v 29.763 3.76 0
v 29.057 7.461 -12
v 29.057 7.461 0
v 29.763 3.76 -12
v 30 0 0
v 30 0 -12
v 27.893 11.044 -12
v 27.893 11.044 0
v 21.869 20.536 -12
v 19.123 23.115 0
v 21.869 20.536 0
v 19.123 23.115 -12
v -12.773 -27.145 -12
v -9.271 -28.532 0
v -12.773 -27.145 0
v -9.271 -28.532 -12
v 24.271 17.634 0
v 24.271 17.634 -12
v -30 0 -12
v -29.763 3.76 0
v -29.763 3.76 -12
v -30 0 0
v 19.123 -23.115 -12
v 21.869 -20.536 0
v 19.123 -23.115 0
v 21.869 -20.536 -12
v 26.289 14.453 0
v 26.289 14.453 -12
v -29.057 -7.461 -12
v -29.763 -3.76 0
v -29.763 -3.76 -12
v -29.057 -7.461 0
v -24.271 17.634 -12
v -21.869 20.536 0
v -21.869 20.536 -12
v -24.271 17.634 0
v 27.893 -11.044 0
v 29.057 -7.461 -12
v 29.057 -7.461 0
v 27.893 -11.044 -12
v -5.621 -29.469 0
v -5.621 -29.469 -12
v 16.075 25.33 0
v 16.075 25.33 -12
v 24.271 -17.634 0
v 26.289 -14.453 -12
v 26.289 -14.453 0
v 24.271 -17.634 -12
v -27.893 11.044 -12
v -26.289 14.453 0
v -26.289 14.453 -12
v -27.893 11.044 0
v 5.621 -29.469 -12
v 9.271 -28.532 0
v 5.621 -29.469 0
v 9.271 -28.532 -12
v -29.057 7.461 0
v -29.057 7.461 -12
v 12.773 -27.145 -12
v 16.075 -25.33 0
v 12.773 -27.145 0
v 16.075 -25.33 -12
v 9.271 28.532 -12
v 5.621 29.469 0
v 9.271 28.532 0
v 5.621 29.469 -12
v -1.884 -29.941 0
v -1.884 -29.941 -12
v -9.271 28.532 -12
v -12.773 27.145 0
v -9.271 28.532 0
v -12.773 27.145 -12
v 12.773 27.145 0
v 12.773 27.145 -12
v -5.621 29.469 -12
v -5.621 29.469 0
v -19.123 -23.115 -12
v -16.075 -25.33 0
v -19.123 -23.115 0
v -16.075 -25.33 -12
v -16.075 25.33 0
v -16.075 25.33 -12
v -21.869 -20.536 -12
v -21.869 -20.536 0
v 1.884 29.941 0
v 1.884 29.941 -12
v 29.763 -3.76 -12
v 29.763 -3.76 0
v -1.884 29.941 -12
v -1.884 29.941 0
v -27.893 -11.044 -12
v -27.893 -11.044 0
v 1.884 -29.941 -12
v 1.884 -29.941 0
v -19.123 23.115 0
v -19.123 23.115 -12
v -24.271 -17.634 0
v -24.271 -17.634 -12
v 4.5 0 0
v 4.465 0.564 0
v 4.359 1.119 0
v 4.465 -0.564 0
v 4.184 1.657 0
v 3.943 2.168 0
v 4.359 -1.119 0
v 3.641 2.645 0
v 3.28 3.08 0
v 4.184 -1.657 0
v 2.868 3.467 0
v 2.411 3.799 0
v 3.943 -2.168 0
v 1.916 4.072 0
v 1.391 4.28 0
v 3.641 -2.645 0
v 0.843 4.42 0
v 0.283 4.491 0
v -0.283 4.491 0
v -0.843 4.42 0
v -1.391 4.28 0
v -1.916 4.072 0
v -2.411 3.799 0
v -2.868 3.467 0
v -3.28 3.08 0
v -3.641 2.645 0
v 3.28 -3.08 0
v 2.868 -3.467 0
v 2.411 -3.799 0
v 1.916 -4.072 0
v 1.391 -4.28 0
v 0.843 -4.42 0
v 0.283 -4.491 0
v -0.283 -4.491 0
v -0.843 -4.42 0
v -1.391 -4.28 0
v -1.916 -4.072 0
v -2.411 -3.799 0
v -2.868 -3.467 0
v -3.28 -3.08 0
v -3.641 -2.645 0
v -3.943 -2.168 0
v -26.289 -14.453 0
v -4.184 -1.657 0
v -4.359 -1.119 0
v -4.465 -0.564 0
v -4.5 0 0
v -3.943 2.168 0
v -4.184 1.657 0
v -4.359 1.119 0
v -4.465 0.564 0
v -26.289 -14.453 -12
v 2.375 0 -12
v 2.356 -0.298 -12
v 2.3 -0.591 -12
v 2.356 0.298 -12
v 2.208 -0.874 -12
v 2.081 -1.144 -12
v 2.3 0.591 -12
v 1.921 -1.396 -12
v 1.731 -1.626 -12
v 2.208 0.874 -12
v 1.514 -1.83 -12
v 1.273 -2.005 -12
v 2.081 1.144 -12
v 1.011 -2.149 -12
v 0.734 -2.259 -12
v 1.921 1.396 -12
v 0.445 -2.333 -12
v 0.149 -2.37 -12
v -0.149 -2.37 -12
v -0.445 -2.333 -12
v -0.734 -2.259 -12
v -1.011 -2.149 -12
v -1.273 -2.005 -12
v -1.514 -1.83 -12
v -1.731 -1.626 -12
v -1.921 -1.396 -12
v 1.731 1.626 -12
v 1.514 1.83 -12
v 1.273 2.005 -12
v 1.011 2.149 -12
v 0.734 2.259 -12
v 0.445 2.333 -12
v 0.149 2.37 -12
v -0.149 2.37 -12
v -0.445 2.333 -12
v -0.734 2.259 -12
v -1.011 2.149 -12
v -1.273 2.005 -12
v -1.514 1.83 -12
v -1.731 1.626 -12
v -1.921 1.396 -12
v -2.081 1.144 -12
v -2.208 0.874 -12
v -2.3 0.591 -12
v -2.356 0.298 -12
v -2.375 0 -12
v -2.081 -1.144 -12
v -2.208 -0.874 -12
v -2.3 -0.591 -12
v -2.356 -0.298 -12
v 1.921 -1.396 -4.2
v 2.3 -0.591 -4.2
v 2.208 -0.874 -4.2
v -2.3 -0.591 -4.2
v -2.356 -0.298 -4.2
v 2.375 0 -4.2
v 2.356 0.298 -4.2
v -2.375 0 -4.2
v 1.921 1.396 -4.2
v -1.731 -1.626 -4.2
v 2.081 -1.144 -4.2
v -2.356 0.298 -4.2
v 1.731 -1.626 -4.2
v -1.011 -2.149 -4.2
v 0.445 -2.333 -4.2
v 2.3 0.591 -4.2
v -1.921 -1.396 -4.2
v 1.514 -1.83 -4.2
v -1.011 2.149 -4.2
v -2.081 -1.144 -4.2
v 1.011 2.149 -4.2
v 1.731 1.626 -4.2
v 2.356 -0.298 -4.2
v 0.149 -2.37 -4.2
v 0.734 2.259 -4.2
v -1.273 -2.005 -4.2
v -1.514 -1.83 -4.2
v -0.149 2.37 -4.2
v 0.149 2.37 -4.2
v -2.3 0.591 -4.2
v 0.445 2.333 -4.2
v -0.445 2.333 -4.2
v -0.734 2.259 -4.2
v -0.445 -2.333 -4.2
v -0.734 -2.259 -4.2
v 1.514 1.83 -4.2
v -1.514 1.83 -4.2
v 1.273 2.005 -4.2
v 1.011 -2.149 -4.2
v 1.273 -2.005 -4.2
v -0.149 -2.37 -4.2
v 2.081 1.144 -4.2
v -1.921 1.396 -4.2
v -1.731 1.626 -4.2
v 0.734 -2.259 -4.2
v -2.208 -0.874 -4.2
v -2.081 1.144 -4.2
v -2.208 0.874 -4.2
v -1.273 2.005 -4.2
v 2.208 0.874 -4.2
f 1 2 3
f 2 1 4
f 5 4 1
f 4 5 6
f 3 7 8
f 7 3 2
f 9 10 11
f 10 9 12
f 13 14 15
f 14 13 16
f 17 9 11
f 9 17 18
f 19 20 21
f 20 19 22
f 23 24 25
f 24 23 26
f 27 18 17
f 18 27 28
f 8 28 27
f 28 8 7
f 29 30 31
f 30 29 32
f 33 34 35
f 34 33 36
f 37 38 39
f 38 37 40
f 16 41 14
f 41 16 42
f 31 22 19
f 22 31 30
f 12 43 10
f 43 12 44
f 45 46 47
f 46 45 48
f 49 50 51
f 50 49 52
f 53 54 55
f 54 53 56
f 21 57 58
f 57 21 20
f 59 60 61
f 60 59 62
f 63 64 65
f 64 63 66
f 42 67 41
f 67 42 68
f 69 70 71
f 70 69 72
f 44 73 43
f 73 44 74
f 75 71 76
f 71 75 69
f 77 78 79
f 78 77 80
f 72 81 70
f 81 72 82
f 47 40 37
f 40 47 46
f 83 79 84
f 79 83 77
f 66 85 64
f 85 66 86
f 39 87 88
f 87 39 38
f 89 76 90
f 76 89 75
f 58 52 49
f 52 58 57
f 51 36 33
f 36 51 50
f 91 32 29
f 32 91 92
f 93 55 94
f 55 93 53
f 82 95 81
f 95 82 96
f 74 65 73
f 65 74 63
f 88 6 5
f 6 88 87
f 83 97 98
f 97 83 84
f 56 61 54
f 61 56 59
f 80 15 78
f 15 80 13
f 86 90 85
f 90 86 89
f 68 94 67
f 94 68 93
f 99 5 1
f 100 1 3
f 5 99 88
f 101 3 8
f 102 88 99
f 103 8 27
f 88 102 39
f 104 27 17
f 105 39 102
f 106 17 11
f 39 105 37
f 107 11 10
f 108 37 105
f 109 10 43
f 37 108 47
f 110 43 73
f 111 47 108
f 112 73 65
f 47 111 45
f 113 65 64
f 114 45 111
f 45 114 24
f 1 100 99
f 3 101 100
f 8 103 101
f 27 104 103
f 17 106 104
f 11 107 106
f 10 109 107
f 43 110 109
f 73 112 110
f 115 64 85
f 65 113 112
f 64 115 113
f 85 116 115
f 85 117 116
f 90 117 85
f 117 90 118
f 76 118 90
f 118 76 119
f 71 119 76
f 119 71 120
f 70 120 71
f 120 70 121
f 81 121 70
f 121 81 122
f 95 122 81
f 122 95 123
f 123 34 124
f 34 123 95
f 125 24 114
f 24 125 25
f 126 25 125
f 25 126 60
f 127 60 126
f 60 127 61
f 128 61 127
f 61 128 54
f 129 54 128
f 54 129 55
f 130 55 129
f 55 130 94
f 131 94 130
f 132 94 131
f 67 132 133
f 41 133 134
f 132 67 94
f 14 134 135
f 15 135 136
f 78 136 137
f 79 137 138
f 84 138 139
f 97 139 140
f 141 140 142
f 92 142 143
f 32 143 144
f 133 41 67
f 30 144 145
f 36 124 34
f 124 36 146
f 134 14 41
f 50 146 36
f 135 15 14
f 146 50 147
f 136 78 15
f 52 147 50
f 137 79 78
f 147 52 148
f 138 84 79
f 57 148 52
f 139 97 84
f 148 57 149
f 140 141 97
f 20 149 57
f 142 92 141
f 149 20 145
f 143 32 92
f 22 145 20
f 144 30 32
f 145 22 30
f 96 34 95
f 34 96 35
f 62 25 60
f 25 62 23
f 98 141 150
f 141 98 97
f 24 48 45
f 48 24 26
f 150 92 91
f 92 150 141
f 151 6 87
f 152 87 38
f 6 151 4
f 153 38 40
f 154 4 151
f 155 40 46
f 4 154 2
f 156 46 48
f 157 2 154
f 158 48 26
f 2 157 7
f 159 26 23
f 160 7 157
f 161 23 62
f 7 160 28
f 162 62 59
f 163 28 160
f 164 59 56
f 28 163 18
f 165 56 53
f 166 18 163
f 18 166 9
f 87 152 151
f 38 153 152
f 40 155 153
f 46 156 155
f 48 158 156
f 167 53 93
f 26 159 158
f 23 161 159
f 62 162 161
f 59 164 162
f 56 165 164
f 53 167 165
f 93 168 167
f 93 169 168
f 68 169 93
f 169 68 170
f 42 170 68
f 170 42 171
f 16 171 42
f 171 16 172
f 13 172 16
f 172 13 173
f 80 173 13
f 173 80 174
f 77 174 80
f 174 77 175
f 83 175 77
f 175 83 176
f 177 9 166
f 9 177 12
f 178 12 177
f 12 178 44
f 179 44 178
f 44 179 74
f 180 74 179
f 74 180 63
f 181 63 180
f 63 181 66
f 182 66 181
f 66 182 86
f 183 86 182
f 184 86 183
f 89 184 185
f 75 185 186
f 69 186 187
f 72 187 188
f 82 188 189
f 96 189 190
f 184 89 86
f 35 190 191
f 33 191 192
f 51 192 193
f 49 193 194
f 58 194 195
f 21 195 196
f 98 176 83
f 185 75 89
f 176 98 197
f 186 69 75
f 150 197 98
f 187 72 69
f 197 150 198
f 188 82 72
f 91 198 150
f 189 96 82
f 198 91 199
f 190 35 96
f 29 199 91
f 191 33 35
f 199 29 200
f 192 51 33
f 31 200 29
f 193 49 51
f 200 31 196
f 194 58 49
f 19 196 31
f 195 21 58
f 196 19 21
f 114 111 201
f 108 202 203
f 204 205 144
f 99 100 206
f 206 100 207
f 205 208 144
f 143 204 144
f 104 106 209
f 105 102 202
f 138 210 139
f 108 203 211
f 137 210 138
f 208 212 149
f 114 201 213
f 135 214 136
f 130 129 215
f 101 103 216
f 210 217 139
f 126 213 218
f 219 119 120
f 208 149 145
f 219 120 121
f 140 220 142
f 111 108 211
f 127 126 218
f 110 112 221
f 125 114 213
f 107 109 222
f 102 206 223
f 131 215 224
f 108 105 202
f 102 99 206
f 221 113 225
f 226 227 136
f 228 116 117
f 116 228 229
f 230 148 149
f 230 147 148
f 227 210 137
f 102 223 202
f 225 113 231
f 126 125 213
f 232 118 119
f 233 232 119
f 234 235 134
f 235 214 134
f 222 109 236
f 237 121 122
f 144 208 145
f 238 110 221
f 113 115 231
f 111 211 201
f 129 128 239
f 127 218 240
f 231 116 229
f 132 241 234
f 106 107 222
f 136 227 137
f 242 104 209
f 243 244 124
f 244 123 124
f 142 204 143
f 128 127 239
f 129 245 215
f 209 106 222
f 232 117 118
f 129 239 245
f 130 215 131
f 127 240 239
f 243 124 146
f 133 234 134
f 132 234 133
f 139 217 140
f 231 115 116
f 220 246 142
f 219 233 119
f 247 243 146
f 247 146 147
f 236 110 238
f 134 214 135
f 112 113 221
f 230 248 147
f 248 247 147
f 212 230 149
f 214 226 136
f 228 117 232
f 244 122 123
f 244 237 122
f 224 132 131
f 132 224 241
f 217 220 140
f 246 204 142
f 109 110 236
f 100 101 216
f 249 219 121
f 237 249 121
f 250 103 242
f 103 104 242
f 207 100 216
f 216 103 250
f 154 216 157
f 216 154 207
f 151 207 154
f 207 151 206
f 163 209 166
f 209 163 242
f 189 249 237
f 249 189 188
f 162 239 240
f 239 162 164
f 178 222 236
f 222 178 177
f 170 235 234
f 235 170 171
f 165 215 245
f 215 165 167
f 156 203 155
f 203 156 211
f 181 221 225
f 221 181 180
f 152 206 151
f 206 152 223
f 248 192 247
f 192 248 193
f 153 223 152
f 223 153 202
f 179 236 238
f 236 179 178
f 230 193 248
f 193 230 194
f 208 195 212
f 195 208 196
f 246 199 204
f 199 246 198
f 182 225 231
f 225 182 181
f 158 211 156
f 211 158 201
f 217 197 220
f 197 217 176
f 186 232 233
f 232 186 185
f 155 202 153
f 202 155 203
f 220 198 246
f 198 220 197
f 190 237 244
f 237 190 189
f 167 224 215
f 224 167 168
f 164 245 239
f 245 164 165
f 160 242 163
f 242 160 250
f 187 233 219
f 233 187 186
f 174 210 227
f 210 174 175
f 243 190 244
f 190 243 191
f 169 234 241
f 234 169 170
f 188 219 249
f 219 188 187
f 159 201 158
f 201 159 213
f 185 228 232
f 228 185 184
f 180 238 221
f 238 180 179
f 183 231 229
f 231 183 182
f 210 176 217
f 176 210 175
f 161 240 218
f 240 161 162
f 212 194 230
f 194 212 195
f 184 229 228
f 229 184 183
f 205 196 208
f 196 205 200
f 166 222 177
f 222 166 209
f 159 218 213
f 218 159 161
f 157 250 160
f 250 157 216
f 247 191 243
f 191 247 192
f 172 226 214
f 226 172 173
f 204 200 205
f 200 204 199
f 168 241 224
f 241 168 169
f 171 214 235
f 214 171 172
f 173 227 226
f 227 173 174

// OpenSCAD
$fn = 50;


difference() {
	union() {
		translate(v = [0, 0, -12.0000000000]) {
			cylinder(h = 12, r = 30.0000000000);
		}
		translate(v = [0, 0, -12.0000000000]) {
			cylinder(h = 12, r = 2.8750000000);
		}
	}
	union() {
		translate(v = [0, 0, 0]) {
			rotate(a = [0, 0, 0]) {
				difference() {
					union() {
						translate(v = [0, 0, -12.0000000000]) {
							cylinder(h = 12, r = 2.2500000000);
						}
						translate(v = [0, 0, -4.2000000000]) {
							cylinder(h = 4.2000000000, r1 = 2.3750000000, r2 = 4.5000000000);
						}
						translate(v = [0, 0, -12.0000000000]) {
							cylinder(h = 12, r = 2.3750000000);
						}
						translate(v = [0, 0, -12.0000000000]) {
							cylinder(h = 12, r = 2.2500000000);
						}
					}
					union();
				}
			}
		}
	}
}
